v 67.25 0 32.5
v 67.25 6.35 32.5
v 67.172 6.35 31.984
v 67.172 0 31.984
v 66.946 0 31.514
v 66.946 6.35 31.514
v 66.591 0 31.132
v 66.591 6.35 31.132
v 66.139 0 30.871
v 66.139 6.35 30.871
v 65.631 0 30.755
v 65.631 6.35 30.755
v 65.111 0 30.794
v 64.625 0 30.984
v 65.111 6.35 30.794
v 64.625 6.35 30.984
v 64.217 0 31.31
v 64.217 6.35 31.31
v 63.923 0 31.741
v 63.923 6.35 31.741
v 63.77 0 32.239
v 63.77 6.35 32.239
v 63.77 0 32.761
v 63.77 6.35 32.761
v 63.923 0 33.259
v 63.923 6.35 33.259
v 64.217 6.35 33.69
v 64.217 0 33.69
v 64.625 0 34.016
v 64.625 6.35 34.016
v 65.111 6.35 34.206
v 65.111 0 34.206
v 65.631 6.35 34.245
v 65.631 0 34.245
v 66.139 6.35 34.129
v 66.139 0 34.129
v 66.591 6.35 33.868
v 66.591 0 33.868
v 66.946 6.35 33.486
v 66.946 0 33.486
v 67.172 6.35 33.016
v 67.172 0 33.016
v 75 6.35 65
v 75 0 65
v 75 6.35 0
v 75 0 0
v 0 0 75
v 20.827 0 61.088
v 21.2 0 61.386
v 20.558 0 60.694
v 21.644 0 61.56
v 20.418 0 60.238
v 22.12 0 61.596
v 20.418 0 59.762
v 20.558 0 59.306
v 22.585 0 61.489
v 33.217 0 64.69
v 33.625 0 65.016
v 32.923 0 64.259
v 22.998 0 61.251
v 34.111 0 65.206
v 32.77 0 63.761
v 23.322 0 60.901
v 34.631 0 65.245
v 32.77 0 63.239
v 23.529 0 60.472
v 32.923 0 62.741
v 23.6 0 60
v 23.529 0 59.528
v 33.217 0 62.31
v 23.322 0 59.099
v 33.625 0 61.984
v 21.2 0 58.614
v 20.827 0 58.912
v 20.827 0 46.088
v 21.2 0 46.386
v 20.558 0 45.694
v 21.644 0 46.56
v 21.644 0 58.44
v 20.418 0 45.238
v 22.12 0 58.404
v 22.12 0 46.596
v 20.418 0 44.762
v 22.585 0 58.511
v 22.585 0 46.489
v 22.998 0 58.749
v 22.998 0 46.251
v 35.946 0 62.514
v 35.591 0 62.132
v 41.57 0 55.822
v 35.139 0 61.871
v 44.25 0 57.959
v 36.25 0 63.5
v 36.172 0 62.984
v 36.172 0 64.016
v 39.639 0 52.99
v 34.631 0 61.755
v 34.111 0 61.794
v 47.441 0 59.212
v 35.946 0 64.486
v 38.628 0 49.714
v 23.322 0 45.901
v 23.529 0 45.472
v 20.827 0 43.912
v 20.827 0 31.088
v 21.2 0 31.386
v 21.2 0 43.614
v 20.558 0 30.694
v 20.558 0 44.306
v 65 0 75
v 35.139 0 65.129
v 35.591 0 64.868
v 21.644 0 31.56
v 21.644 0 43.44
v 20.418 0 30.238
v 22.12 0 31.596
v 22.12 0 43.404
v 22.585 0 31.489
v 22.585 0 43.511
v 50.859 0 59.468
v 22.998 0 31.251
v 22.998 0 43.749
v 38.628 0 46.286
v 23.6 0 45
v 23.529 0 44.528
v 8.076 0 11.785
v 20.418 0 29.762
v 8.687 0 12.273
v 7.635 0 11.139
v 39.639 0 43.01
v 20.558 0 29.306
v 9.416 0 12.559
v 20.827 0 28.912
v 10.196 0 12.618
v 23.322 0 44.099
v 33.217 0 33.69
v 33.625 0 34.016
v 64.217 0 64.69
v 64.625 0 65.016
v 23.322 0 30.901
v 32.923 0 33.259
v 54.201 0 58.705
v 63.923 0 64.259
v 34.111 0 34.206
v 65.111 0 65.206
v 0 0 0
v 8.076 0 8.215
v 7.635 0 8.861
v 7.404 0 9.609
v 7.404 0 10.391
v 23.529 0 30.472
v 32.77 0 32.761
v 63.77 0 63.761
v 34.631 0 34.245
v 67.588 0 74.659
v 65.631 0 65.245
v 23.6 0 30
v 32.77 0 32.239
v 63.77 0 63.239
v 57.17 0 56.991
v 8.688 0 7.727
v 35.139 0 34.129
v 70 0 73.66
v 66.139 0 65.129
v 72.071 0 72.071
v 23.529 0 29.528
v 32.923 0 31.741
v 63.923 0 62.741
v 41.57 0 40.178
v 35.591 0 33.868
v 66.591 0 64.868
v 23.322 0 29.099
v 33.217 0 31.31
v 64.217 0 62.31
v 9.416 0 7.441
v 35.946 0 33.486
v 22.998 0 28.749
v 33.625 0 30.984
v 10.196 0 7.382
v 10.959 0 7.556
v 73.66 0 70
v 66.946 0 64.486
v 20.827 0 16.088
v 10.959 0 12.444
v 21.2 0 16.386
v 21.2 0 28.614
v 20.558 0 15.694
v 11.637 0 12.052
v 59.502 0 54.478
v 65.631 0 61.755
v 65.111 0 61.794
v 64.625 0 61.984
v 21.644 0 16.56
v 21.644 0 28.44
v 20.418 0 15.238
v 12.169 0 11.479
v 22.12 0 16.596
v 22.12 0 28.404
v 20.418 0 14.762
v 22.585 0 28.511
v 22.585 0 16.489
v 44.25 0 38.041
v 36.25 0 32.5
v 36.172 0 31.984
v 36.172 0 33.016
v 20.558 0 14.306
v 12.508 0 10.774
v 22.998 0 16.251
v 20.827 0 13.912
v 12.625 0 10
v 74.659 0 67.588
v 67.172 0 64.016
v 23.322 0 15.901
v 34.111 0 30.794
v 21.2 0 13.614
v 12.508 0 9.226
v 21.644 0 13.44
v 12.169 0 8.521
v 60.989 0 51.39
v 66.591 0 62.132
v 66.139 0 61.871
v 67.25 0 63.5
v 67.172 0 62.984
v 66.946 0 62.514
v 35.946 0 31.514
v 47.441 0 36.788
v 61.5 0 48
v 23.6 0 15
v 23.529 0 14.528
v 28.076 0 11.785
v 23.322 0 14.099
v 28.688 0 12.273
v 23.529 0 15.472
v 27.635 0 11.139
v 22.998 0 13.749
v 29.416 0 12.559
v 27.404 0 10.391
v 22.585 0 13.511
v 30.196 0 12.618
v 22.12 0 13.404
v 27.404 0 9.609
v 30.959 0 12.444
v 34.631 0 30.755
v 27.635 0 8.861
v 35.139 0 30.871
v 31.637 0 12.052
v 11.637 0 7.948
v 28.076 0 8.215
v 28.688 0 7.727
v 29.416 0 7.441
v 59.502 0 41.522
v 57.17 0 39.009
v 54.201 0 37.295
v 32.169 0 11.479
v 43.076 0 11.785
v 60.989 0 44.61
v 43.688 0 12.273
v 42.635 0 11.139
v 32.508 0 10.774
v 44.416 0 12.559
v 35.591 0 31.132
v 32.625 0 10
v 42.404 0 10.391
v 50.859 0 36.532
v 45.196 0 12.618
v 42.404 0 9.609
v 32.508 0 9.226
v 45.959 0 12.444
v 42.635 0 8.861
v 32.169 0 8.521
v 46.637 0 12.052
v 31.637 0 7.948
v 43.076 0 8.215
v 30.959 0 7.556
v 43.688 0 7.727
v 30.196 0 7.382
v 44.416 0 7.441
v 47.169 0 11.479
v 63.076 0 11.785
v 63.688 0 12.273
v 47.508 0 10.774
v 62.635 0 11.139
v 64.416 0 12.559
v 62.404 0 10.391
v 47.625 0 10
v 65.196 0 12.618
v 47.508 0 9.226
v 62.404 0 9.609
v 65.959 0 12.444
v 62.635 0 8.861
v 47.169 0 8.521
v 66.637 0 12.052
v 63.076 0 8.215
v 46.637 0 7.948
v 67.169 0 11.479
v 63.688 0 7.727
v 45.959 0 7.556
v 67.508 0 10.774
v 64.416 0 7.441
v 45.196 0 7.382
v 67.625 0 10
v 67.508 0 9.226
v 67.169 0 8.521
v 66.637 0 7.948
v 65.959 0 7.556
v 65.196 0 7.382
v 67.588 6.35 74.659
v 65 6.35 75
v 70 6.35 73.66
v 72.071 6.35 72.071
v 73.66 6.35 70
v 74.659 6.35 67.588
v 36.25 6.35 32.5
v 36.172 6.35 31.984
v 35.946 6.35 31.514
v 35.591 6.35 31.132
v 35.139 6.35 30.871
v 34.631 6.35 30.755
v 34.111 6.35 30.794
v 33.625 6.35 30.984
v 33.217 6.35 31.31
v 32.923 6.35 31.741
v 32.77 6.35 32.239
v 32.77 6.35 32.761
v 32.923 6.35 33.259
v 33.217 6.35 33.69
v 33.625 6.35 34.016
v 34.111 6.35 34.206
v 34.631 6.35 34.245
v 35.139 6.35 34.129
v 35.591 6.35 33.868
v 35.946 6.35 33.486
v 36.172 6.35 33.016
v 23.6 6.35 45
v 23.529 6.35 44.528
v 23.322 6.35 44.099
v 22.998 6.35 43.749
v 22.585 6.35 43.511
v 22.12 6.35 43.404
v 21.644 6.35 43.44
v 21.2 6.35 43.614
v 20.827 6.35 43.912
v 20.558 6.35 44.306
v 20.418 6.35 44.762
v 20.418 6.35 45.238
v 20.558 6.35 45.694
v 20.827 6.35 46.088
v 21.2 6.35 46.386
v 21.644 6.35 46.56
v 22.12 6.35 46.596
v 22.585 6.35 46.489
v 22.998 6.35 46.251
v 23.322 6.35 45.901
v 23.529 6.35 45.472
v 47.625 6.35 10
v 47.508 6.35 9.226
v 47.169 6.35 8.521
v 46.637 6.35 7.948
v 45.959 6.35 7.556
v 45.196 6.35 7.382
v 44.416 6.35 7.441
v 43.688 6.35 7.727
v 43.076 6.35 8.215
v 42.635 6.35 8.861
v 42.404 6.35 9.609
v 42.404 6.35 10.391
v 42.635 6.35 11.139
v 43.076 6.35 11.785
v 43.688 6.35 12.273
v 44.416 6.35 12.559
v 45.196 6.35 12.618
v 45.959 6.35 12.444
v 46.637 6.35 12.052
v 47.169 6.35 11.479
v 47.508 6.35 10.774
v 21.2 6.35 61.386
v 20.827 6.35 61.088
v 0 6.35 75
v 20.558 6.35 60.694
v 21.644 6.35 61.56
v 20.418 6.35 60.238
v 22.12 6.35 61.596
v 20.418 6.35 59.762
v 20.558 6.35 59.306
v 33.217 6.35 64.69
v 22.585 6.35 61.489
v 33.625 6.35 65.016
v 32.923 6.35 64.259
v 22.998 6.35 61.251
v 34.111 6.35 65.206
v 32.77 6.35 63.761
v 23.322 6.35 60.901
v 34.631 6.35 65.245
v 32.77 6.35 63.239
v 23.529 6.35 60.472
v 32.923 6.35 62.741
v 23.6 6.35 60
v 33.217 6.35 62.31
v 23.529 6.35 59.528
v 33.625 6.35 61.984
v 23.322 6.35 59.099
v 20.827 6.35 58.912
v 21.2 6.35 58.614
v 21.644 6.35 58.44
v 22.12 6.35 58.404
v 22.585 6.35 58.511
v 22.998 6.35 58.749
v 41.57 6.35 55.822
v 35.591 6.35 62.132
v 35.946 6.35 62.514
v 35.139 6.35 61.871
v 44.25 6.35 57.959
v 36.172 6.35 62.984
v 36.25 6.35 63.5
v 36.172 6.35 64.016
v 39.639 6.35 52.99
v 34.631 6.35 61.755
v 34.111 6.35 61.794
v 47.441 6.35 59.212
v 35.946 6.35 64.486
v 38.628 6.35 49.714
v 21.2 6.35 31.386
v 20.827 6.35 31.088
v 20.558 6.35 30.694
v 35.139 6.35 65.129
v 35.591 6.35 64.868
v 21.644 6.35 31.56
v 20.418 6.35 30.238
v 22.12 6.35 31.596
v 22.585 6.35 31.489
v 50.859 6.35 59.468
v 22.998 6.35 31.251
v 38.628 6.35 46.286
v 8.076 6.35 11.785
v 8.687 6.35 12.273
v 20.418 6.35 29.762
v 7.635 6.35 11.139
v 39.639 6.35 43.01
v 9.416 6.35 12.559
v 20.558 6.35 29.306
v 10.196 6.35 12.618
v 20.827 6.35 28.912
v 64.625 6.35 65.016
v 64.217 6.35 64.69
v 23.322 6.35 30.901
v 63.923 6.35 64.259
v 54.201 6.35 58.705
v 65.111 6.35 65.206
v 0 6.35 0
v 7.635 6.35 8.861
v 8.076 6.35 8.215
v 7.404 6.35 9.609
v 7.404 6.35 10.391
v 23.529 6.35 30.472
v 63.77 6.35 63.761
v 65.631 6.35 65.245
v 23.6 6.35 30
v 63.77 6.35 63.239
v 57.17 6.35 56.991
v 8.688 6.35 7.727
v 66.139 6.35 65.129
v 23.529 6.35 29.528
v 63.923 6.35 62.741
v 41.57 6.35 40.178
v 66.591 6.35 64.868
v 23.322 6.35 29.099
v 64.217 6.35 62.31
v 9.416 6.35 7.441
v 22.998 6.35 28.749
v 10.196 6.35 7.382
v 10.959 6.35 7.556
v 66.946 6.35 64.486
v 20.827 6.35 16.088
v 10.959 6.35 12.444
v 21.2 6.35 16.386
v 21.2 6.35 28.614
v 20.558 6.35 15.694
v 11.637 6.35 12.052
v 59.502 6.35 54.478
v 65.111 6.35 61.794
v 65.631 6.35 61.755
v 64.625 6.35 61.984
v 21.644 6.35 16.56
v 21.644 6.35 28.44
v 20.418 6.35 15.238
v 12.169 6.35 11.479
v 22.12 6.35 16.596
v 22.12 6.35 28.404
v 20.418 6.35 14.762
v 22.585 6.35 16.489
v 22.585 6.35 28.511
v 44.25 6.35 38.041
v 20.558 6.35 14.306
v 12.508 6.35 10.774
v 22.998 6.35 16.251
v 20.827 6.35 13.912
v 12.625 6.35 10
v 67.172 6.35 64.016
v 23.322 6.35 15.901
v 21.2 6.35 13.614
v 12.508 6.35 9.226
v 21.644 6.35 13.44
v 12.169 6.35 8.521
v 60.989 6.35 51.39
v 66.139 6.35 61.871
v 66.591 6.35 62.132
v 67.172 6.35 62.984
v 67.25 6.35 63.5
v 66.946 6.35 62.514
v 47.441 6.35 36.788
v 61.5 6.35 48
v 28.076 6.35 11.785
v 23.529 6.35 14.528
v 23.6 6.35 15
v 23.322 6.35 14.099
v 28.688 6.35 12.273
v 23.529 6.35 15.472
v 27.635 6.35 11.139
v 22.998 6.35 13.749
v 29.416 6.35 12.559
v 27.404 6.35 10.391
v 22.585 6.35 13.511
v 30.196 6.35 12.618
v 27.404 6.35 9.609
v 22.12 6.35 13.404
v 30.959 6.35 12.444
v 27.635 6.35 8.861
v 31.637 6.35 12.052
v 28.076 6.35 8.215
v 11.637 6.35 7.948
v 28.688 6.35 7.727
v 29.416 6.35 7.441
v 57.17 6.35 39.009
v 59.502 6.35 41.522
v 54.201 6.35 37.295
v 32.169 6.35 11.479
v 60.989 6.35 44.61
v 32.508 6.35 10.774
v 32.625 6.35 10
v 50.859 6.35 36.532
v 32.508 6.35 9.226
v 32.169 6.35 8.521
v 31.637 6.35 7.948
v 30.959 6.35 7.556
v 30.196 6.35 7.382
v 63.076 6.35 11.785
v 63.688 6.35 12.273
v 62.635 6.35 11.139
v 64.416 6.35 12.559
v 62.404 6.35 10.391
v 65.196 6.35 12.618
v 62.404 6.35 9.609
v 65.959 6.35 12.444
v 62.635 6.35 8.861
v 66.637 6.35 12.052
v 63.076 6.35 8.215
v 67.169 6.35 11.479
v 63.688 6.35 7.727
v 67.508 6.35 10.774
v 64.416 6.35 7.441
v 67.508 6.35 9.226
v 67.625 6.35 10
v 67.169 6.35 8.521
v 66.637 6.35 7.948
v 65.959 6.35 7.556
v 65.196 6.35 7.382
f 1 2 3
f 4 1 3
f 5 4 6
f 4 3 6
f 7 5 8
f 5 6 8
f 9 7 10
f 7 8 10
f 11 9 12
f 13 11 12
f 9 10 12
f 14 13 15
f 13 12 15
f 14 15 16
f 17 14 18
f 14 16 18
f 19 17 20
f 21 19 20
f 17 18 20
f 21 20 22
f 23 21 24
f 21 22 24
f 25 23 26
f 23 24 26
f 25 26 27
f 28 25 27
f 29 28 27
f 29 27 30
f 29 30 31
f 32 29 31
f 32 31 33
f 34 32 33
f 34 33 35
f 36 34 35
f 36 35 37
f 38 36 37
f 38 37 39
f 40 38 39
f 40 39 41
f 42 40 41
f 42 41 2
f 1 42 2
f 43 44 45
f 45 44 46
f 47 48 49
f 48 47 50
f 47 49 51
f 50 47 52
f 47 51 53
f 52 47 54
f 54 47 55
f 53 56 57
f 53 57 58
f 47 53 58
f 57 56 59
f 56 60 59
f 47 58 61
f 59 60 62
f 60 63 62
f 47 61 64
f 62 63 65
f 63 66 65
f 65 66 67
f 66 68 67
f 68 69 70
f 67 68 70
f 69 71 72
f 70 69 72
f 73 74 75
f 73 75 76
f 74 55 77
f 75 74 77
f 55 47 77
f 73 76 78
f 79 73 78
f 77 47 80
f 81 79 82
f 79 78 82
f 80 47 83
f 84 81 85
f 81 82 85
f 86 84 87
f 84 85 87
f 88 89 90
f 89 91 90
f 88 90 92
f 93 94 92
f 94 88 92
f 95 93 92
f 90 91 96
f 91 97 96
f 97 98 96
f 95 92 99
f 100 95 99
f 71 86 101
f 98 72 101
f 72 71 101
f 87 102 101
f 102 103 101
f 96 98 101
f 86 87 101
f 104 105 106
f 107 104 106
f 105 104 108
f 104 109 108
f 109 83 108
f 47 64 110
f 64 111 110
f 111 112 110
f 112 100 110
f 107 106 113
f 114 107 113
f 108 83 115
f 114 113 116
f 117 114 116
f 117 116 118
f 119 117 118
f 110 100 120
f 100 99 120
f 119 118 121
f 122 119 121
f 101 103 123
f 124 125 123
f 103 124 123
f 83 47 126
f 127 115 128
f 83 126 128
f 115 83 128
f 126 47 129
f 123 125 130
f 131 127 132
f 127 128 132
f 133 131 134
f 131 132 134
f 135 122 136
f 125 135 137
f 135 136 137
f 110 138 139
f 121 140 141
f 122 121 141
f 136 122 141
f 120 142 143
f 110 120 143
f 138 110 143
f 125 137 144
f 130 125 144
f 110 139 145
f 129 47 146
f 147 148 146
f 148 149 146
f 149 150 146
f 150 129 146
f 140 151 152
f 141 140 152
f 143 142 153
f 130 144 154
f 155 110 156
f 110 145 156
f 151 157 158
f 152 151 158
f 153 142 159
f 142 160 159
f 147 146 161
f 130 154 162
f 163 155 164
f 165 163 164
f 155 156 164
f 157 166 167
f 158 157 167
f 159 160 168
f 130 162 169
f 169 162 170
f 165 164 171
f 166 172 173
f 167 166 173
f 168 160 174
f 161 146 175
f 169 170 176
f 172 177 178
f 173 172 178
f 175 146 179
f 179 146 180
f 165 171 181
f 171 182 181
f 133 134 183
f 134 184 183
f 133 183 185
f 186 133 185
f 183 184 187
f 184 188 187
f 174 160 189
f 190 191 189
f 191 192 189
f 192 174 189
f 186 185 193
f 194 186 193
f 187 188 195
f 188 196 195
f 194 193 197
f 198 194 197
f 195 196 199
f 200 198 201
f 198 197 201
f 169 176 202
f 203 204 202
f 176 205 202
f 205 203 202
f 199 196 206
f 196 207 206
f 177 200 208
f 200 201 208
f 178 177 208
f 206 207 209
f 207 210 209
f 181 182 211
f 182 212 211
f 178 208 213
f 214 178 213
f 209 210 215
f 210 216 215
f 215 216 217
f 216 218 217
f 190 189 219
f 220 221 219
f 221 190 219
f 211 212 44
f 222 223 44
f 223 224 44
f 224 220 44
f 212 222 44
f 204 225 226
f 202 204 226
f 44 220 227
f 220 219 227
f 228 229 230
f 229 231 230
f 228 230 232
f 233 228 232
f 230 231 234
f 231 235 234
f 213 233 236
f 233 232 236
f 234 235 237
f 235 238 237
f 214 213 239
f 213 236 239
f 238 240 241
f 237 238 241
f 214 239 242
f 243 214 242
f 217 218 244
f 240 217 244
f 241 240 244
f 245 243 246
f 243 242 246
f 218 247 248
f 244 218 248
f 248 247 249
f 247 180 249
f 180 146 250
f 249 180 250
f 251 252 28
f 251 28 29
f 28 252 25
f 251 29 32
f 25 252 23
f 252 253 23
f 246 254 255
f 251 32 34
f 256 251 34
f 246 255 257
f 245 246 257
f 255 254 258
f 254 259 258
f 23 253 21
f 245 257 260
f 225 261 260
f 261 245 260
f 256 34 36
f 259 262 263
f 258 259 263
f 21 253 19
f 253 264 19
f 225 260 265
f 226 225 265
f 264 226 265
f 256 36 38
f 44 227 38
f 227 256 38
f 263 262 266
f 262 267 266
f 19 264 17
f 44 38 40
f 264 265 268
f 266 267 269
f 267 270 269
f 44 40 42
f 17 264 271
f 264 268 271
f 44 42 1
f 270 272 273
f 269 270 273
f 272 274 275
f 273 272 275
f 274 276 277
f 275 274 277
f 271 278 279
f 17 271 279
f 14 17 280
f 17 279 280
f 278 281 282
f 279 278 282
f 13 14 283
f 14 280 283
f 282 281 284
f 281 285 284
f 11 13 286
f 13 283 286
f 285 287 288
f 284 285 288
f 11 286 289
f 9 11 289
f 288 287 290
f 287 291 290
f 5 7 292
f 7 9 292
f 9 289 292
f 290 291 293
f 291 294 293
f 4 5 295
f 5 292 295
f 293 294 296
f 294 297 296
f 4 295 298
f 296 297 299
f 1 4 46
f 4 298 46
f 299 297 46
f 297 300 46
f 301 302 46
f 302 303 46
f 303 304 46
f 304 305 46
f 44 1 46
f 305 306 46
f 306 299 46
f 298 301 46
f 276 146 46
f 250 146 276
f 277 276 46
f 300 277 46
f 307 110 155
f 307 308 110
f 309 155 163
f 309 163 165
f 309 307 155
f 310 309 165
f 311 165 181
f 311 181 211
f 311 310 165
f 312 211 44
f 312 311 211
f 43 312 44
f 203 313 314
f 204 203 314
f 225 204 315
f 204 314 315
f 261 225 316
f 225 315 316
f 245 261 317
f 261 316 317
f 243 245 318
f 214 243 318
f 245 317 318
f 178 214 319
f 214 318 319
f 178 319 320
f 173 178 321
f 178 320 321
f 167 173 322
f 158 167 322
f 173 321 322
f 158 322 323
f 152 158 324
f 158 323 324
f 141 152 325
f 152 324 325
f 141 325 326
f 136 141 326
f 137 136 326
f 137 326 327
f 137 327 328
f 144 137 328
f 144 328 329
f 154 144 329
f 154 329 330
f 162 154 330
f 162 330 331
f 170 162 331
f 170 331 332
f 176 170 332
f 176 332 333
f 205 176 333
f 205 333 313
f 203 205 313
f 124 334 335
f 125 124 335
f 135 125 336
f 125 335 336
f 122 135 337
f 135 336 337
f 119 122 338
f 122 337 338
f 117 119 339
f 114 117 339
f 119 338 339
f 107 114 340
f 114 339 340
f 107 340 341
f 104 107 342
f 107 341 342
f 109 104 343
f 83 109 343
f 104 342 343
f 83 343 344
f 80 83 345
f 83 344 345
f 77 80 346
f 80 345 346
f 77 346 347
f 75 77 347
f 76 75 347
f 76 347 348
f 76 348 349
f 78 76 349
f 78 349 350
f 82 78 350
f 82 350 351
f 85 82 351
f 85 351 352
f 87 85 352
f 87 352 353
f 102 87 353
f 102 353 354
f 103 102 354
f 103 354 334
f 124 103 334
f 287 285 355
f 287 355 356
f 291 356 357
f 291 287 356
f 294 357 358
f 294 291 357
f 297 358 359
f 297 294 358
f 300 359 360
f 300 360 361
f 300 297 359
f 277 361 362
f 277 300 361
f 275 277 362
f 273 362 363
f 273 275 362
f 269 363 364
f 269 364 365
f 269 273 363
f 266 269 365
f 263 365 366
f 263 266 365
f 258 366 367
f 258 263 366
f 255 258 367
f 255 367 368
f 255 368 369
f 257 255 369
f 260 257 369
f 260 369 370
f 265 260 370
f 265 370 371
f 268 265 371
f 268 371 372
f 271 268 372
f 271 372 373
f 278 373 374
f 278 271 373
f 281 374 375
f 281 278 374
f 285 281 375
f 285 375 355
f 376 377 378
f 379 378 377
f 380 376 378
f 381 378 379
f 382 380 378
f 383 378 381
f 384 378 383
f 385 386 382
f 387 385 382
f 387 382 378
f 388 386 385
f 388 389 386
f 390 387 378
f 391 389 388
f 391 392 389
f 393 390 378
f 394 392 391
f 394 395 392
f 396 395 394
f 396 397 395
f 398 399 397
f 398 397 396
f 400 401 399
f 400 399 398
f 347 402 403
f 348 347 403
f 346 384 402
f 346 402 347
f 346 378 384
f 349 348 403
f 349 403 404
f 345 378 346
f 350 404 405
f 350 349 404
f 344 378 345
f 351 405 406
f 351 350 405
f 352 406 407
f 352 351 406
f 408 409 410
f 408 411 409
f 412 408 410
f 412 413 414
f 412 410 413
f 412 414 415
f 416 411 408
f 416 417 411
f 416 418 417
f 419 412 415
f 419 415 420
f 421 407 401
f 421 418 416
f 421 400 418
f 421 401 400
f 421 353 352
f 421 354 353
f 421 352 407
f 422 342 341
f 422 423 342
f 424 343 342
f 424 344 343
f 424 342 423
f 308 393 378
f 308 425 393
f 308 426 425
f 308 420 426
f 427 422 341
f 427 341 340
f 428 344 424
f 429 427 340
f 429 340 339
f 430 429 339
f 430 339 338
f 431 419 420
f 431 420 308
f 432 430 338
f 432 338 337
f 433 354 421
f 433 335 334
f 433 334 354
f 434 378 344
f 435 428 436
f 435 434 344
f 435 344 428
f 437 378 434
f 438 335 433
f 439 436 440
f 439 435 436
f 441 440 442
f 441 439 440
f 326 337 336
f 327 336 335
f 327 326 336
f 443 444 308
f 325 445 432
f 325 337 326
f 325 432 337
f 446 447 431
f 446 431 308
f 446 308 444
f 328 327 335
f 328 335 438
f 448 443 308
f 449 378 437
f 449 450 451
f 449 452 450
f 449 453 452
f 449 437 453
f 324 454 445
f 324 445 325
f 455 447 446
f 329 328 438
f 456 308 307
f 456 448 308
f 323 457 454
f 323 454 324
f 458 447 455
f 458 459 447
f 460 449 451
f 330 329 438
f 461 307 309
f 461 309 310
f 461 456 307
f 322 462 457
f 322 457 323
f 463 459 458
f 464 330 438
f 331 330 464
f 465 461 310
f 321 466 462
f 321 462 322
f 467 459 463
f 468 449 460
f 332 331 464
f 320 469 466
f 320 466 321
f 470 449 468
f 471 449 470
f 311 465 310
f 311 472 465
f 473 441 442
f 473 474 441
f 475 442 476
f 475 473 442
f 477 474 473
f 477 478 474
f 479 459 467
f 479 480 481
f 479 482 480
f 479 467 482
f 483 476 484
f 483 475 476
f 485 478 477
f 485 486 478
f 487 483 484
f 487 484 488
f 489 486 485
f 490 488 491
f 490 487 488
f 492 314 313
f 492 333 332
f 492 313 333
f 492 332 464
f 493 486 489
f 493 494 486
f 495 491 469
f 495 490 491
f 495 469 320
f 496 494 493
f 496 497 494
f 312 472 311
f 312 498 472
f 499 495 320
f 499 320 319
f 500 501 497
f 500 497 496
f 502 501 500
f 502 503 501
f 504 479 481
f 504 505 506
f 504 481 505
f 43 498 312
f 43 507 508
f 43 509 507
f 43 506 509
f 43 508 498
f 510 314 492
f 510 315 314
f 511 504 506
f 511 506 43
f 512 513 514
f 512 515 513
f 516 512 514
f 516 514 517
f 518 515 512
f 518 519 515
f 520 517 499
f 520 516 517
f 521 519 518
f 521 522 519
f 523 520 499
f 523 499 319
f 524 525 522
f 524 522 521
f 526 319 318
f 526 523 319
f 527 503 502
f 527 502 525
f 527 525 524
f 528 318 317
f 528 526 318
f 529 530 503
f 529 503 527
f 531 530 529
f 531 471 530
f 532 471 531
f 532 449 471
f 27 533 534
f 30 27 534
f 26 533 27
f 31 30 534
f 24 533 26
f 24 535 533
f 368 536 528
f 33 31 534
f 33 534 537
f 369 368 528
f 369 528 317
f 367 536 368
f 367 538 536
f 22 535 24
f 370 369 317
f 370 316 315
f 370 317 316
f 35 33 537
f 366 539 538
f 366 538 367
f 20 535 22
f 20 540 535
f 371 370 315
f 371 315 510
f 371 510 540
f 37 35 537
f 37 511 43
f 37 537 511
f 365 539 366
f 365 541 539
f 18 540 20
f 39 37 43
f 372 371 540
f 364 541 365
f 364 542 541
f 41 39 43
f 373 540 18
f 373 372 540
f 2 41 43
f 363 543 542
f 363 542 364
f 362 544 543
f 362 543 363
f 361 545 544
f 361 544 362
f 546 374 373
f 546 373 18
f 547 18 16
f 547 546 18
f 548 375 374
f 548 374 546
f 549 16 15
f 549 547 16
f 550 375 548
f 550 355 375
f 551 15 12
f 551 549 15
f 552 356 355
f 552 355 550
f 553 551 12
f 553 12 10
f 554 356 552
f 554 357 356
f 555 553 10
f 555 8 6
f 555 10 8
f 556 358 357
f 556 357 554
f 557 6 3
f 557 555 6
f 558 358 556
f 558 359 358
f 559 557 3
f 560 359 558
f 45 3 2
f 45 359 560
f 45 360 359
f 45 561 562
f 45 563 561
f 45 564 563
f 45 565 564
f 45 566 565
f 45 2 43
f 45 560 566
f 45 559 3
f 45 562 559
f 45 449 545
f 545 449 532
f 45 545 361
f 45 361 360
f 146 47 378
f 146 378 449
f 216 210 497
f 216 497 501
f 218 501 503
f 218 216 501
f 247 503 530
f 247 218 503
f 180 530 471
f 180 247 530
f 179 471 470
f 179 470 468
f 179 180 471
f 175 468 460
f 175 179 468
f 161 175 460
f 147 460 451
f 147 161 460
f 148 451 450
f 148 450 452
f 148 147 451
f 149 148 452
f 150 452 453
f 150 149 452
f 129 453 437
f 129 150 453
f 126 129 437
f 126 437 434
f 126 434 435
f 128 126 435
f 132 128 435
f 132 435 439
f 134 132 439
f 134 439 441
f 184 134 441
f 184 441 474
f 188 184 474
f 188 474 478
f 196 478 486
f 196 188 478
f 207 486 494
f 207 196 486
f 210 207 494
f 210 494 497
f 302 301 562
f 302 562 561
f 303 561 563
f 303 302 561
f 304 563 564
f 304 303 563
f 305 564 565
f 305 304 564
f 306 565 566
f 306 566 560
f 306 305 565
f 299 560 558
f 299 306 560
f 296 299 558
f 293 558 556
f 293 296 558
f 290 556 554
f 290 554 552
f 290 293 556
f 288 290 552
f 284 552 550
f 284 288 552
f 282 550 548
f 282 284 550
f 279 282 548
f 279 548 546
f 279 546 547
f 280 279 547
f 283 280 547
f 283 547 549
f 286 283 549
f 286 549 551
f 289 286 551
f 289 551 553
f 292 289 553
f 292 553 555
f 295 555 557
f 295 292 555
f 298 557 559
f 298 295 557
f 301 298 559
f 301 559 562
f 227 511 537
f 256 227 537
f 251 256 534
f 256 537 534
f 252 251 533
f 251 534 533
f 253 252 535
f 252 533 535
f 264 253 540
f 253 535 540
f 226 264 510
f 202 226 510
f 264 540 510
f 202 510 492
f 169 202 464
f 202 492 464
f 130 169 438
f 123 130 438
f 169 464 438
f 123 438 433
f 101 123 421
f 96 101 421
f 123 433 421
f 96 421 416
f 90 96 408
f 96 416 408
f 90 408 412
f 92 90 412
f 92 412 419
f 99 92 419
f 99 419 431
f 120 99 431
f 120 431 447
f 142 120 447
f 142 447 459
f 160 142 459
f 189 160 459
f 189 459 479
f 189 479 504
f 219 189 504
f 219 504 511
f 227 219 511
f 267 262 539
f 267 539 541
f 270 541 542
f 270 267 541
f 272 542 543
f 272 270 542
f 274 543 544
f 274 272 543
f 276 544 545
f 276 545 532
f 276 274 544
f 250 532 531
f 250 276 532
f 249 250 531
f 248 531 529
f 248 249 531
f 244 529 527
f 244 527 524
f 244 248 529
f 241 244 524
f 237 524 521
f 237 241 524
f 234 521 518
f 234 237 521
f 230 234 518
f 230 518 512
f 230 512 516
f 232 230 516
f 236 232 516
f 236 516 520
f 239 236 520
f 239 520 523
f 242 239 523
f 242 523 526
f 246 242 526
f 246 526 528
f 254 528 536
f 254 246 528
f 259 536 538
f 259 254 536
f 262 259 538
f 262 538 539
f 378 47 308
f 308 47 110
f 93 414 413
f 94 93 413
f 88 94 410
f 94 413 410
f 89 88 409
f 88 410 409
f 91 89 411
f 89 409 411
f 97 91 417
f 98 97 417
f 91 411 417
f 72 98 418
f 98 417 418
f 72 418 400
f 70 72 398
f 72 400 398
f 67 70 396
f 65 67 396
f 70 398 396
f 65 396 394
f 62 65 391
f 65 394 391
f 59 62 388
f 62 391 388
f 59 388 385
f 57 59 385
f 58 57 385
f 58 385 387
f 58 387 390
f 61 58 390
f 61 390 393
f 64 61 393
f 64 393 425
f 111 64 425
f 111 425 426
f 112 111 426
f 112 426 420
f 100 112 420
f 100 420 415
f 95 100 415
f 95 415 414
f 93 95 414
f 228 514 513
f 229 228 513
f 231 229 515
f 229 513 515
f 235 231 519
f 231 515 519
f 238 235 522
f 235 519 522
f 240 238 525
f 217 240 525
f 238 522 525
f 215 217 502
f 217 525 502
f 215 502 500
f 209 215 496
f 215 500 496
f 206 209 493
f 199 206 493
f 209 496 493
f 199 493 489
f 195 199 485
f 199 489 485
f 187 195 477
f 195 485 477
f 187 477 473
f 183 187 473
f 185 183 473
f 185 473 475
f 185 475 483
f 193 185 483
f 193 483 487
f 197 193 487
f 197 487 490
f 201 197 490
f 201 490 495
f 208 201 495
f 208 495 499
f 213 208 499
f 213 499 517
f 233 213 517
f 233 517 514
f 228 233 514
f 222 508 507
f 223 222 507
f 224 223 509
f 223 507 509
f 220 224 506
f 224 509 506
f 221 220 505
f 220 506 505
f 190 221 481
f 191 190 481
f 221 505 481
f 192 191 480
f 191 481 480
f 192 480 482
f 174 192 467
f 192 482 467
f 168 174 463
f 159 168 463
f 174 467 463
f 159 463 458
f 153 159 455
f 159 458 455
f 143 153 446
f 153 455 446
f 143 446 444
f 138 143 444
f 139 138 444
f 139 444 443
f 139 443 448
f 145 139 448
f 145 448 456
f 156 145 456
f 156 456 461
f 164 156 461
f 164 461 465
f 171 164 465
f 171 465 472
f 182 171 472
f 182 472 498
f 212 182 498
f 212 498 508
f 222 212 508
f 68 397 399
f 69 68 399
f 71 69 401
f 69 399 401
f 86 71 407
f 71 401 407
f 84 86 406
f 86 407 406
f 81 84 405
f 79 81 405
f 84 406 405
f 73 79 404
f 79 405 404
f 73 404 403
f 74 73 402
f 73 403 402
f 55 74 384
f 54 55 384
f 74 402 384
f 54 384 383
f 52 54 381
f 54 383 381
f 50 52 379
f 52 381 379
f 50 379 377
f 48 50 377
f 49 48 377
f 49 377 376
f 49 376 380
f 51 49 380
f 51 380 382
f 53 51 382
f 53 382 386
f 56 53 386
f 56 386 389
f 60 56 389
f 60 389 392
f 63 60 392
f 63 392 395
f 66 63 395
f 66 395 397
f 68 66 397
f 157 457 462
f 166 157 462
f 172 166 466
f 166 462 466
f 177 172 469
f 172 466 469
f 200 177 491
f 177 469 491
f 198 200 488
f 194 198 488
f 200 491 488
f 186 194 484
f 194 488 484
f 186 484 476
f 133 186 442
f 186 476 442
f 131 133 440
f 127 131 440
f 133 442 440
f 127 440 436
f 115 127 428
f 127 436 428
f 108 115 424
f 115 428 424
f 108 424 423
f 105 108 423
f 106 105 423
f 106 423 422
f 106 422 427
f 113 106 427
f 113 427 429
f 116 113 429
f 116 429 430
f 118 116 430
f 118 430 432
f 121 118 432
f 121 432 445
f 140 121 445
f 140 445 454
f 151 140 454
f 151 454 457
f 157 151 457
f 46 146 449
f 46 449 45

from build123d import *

# Parameters (mm, degrees)
SKETCH1_W           = 75
SKETCH1_H           = 75
SKETCH1_R           = 2.625
BOSS_EXTRUDE1_DEPTH = 6.35
FILLET1_R           = 10
SKETCH3_R           = 11.5
SKETCH3_R_2         = 1.75
CUT_EXTRUDE2_DEPTH  = 7.35
SKETCH4_R           = 1.6
CUT_EXTRUDE3_DEPTH  = 7.35


with BuildPart() as part:
    # Sketch1 → Boss-Extrude1 (new body)
    with BuildSketch(Plane(origin=(0, 0, 0), x_dir=(1, 0, 0), z_dir=(0, 1, 0))):
        with Locations((37.5, -37.5)):
            Rectangle(SKETCH1_W, SKETCH1_H)
        with Locations((10, -10)):
            Circle(SKETCH1_R, mode=Mode.SUBTRACT)
        with Locations((45, -10)):
            Circle(SKETCH1_R, mode=Mode.SUBTRACT)
        with Locations((65, -10)):
            Circle(SKETCH1_R, mode=Mode.SUBTRACT)
        with Locations((30, -10)):
            Circle(SKETCH1_R, mode=Mode.SUBTRACT)
    extrude(amount=BOSS_EXTRUDE1_DEPTH)

    # Fillet1
    fillet1_edges = [part.edges().sort_by_distance(p)[0] for p in [
        (75, 3.175, 75),
    ]]
    fillet(fillet1_edges, radius=FILLET1_R)

    # Sketch3 → Cut-Extrude2 (cut, through all)
    with BuildSketch(Plane(origin=(0, 6.35, 0), x_dir=(1, 0, 0), z_dir=(0, 1, 0))):
        with Locations((50, -48)):
            Circle(SKETCH3_R)
        with Locations((34.5, -32.5)):
            Circle(SKETCH3_R_2)
        with Locations((65.5, -32.5)):
            Circle(SKETCH3_R_2)
        with Locations((65.5, -63.5)):
            Circle(SKETCH3_R_2)
        with Locations((34.5, -63.5)):
            Circle(SKETCH3_R_2)
    extrude(amount=-CUT_EXTRUDE2_DEPTH, mode=Mode.SUBTRACT)

    # Sketch4 → Cut-Extrude3 (cut, through all)
    with BuildSketch(Plane(origin=(0, 6.35, 0), x_dir=(1, 0, 0), z_dir=(0, 1, 0))):
        with Locations((22, -15)):
            Circle(SKETCH4_R)
        with Locations((22, -30)):
            Circle(SKETCH4_R)
        with Locations((22, -45)):
            Circle(SKETCH4_R)
        with Locations((22, -60)):
            Circle(SKETCH4_R)
    extrude(amount=-CUT_EXTRUDE3_DEPTH, mode=Mode.SUBTRACT)


solid = part.part
